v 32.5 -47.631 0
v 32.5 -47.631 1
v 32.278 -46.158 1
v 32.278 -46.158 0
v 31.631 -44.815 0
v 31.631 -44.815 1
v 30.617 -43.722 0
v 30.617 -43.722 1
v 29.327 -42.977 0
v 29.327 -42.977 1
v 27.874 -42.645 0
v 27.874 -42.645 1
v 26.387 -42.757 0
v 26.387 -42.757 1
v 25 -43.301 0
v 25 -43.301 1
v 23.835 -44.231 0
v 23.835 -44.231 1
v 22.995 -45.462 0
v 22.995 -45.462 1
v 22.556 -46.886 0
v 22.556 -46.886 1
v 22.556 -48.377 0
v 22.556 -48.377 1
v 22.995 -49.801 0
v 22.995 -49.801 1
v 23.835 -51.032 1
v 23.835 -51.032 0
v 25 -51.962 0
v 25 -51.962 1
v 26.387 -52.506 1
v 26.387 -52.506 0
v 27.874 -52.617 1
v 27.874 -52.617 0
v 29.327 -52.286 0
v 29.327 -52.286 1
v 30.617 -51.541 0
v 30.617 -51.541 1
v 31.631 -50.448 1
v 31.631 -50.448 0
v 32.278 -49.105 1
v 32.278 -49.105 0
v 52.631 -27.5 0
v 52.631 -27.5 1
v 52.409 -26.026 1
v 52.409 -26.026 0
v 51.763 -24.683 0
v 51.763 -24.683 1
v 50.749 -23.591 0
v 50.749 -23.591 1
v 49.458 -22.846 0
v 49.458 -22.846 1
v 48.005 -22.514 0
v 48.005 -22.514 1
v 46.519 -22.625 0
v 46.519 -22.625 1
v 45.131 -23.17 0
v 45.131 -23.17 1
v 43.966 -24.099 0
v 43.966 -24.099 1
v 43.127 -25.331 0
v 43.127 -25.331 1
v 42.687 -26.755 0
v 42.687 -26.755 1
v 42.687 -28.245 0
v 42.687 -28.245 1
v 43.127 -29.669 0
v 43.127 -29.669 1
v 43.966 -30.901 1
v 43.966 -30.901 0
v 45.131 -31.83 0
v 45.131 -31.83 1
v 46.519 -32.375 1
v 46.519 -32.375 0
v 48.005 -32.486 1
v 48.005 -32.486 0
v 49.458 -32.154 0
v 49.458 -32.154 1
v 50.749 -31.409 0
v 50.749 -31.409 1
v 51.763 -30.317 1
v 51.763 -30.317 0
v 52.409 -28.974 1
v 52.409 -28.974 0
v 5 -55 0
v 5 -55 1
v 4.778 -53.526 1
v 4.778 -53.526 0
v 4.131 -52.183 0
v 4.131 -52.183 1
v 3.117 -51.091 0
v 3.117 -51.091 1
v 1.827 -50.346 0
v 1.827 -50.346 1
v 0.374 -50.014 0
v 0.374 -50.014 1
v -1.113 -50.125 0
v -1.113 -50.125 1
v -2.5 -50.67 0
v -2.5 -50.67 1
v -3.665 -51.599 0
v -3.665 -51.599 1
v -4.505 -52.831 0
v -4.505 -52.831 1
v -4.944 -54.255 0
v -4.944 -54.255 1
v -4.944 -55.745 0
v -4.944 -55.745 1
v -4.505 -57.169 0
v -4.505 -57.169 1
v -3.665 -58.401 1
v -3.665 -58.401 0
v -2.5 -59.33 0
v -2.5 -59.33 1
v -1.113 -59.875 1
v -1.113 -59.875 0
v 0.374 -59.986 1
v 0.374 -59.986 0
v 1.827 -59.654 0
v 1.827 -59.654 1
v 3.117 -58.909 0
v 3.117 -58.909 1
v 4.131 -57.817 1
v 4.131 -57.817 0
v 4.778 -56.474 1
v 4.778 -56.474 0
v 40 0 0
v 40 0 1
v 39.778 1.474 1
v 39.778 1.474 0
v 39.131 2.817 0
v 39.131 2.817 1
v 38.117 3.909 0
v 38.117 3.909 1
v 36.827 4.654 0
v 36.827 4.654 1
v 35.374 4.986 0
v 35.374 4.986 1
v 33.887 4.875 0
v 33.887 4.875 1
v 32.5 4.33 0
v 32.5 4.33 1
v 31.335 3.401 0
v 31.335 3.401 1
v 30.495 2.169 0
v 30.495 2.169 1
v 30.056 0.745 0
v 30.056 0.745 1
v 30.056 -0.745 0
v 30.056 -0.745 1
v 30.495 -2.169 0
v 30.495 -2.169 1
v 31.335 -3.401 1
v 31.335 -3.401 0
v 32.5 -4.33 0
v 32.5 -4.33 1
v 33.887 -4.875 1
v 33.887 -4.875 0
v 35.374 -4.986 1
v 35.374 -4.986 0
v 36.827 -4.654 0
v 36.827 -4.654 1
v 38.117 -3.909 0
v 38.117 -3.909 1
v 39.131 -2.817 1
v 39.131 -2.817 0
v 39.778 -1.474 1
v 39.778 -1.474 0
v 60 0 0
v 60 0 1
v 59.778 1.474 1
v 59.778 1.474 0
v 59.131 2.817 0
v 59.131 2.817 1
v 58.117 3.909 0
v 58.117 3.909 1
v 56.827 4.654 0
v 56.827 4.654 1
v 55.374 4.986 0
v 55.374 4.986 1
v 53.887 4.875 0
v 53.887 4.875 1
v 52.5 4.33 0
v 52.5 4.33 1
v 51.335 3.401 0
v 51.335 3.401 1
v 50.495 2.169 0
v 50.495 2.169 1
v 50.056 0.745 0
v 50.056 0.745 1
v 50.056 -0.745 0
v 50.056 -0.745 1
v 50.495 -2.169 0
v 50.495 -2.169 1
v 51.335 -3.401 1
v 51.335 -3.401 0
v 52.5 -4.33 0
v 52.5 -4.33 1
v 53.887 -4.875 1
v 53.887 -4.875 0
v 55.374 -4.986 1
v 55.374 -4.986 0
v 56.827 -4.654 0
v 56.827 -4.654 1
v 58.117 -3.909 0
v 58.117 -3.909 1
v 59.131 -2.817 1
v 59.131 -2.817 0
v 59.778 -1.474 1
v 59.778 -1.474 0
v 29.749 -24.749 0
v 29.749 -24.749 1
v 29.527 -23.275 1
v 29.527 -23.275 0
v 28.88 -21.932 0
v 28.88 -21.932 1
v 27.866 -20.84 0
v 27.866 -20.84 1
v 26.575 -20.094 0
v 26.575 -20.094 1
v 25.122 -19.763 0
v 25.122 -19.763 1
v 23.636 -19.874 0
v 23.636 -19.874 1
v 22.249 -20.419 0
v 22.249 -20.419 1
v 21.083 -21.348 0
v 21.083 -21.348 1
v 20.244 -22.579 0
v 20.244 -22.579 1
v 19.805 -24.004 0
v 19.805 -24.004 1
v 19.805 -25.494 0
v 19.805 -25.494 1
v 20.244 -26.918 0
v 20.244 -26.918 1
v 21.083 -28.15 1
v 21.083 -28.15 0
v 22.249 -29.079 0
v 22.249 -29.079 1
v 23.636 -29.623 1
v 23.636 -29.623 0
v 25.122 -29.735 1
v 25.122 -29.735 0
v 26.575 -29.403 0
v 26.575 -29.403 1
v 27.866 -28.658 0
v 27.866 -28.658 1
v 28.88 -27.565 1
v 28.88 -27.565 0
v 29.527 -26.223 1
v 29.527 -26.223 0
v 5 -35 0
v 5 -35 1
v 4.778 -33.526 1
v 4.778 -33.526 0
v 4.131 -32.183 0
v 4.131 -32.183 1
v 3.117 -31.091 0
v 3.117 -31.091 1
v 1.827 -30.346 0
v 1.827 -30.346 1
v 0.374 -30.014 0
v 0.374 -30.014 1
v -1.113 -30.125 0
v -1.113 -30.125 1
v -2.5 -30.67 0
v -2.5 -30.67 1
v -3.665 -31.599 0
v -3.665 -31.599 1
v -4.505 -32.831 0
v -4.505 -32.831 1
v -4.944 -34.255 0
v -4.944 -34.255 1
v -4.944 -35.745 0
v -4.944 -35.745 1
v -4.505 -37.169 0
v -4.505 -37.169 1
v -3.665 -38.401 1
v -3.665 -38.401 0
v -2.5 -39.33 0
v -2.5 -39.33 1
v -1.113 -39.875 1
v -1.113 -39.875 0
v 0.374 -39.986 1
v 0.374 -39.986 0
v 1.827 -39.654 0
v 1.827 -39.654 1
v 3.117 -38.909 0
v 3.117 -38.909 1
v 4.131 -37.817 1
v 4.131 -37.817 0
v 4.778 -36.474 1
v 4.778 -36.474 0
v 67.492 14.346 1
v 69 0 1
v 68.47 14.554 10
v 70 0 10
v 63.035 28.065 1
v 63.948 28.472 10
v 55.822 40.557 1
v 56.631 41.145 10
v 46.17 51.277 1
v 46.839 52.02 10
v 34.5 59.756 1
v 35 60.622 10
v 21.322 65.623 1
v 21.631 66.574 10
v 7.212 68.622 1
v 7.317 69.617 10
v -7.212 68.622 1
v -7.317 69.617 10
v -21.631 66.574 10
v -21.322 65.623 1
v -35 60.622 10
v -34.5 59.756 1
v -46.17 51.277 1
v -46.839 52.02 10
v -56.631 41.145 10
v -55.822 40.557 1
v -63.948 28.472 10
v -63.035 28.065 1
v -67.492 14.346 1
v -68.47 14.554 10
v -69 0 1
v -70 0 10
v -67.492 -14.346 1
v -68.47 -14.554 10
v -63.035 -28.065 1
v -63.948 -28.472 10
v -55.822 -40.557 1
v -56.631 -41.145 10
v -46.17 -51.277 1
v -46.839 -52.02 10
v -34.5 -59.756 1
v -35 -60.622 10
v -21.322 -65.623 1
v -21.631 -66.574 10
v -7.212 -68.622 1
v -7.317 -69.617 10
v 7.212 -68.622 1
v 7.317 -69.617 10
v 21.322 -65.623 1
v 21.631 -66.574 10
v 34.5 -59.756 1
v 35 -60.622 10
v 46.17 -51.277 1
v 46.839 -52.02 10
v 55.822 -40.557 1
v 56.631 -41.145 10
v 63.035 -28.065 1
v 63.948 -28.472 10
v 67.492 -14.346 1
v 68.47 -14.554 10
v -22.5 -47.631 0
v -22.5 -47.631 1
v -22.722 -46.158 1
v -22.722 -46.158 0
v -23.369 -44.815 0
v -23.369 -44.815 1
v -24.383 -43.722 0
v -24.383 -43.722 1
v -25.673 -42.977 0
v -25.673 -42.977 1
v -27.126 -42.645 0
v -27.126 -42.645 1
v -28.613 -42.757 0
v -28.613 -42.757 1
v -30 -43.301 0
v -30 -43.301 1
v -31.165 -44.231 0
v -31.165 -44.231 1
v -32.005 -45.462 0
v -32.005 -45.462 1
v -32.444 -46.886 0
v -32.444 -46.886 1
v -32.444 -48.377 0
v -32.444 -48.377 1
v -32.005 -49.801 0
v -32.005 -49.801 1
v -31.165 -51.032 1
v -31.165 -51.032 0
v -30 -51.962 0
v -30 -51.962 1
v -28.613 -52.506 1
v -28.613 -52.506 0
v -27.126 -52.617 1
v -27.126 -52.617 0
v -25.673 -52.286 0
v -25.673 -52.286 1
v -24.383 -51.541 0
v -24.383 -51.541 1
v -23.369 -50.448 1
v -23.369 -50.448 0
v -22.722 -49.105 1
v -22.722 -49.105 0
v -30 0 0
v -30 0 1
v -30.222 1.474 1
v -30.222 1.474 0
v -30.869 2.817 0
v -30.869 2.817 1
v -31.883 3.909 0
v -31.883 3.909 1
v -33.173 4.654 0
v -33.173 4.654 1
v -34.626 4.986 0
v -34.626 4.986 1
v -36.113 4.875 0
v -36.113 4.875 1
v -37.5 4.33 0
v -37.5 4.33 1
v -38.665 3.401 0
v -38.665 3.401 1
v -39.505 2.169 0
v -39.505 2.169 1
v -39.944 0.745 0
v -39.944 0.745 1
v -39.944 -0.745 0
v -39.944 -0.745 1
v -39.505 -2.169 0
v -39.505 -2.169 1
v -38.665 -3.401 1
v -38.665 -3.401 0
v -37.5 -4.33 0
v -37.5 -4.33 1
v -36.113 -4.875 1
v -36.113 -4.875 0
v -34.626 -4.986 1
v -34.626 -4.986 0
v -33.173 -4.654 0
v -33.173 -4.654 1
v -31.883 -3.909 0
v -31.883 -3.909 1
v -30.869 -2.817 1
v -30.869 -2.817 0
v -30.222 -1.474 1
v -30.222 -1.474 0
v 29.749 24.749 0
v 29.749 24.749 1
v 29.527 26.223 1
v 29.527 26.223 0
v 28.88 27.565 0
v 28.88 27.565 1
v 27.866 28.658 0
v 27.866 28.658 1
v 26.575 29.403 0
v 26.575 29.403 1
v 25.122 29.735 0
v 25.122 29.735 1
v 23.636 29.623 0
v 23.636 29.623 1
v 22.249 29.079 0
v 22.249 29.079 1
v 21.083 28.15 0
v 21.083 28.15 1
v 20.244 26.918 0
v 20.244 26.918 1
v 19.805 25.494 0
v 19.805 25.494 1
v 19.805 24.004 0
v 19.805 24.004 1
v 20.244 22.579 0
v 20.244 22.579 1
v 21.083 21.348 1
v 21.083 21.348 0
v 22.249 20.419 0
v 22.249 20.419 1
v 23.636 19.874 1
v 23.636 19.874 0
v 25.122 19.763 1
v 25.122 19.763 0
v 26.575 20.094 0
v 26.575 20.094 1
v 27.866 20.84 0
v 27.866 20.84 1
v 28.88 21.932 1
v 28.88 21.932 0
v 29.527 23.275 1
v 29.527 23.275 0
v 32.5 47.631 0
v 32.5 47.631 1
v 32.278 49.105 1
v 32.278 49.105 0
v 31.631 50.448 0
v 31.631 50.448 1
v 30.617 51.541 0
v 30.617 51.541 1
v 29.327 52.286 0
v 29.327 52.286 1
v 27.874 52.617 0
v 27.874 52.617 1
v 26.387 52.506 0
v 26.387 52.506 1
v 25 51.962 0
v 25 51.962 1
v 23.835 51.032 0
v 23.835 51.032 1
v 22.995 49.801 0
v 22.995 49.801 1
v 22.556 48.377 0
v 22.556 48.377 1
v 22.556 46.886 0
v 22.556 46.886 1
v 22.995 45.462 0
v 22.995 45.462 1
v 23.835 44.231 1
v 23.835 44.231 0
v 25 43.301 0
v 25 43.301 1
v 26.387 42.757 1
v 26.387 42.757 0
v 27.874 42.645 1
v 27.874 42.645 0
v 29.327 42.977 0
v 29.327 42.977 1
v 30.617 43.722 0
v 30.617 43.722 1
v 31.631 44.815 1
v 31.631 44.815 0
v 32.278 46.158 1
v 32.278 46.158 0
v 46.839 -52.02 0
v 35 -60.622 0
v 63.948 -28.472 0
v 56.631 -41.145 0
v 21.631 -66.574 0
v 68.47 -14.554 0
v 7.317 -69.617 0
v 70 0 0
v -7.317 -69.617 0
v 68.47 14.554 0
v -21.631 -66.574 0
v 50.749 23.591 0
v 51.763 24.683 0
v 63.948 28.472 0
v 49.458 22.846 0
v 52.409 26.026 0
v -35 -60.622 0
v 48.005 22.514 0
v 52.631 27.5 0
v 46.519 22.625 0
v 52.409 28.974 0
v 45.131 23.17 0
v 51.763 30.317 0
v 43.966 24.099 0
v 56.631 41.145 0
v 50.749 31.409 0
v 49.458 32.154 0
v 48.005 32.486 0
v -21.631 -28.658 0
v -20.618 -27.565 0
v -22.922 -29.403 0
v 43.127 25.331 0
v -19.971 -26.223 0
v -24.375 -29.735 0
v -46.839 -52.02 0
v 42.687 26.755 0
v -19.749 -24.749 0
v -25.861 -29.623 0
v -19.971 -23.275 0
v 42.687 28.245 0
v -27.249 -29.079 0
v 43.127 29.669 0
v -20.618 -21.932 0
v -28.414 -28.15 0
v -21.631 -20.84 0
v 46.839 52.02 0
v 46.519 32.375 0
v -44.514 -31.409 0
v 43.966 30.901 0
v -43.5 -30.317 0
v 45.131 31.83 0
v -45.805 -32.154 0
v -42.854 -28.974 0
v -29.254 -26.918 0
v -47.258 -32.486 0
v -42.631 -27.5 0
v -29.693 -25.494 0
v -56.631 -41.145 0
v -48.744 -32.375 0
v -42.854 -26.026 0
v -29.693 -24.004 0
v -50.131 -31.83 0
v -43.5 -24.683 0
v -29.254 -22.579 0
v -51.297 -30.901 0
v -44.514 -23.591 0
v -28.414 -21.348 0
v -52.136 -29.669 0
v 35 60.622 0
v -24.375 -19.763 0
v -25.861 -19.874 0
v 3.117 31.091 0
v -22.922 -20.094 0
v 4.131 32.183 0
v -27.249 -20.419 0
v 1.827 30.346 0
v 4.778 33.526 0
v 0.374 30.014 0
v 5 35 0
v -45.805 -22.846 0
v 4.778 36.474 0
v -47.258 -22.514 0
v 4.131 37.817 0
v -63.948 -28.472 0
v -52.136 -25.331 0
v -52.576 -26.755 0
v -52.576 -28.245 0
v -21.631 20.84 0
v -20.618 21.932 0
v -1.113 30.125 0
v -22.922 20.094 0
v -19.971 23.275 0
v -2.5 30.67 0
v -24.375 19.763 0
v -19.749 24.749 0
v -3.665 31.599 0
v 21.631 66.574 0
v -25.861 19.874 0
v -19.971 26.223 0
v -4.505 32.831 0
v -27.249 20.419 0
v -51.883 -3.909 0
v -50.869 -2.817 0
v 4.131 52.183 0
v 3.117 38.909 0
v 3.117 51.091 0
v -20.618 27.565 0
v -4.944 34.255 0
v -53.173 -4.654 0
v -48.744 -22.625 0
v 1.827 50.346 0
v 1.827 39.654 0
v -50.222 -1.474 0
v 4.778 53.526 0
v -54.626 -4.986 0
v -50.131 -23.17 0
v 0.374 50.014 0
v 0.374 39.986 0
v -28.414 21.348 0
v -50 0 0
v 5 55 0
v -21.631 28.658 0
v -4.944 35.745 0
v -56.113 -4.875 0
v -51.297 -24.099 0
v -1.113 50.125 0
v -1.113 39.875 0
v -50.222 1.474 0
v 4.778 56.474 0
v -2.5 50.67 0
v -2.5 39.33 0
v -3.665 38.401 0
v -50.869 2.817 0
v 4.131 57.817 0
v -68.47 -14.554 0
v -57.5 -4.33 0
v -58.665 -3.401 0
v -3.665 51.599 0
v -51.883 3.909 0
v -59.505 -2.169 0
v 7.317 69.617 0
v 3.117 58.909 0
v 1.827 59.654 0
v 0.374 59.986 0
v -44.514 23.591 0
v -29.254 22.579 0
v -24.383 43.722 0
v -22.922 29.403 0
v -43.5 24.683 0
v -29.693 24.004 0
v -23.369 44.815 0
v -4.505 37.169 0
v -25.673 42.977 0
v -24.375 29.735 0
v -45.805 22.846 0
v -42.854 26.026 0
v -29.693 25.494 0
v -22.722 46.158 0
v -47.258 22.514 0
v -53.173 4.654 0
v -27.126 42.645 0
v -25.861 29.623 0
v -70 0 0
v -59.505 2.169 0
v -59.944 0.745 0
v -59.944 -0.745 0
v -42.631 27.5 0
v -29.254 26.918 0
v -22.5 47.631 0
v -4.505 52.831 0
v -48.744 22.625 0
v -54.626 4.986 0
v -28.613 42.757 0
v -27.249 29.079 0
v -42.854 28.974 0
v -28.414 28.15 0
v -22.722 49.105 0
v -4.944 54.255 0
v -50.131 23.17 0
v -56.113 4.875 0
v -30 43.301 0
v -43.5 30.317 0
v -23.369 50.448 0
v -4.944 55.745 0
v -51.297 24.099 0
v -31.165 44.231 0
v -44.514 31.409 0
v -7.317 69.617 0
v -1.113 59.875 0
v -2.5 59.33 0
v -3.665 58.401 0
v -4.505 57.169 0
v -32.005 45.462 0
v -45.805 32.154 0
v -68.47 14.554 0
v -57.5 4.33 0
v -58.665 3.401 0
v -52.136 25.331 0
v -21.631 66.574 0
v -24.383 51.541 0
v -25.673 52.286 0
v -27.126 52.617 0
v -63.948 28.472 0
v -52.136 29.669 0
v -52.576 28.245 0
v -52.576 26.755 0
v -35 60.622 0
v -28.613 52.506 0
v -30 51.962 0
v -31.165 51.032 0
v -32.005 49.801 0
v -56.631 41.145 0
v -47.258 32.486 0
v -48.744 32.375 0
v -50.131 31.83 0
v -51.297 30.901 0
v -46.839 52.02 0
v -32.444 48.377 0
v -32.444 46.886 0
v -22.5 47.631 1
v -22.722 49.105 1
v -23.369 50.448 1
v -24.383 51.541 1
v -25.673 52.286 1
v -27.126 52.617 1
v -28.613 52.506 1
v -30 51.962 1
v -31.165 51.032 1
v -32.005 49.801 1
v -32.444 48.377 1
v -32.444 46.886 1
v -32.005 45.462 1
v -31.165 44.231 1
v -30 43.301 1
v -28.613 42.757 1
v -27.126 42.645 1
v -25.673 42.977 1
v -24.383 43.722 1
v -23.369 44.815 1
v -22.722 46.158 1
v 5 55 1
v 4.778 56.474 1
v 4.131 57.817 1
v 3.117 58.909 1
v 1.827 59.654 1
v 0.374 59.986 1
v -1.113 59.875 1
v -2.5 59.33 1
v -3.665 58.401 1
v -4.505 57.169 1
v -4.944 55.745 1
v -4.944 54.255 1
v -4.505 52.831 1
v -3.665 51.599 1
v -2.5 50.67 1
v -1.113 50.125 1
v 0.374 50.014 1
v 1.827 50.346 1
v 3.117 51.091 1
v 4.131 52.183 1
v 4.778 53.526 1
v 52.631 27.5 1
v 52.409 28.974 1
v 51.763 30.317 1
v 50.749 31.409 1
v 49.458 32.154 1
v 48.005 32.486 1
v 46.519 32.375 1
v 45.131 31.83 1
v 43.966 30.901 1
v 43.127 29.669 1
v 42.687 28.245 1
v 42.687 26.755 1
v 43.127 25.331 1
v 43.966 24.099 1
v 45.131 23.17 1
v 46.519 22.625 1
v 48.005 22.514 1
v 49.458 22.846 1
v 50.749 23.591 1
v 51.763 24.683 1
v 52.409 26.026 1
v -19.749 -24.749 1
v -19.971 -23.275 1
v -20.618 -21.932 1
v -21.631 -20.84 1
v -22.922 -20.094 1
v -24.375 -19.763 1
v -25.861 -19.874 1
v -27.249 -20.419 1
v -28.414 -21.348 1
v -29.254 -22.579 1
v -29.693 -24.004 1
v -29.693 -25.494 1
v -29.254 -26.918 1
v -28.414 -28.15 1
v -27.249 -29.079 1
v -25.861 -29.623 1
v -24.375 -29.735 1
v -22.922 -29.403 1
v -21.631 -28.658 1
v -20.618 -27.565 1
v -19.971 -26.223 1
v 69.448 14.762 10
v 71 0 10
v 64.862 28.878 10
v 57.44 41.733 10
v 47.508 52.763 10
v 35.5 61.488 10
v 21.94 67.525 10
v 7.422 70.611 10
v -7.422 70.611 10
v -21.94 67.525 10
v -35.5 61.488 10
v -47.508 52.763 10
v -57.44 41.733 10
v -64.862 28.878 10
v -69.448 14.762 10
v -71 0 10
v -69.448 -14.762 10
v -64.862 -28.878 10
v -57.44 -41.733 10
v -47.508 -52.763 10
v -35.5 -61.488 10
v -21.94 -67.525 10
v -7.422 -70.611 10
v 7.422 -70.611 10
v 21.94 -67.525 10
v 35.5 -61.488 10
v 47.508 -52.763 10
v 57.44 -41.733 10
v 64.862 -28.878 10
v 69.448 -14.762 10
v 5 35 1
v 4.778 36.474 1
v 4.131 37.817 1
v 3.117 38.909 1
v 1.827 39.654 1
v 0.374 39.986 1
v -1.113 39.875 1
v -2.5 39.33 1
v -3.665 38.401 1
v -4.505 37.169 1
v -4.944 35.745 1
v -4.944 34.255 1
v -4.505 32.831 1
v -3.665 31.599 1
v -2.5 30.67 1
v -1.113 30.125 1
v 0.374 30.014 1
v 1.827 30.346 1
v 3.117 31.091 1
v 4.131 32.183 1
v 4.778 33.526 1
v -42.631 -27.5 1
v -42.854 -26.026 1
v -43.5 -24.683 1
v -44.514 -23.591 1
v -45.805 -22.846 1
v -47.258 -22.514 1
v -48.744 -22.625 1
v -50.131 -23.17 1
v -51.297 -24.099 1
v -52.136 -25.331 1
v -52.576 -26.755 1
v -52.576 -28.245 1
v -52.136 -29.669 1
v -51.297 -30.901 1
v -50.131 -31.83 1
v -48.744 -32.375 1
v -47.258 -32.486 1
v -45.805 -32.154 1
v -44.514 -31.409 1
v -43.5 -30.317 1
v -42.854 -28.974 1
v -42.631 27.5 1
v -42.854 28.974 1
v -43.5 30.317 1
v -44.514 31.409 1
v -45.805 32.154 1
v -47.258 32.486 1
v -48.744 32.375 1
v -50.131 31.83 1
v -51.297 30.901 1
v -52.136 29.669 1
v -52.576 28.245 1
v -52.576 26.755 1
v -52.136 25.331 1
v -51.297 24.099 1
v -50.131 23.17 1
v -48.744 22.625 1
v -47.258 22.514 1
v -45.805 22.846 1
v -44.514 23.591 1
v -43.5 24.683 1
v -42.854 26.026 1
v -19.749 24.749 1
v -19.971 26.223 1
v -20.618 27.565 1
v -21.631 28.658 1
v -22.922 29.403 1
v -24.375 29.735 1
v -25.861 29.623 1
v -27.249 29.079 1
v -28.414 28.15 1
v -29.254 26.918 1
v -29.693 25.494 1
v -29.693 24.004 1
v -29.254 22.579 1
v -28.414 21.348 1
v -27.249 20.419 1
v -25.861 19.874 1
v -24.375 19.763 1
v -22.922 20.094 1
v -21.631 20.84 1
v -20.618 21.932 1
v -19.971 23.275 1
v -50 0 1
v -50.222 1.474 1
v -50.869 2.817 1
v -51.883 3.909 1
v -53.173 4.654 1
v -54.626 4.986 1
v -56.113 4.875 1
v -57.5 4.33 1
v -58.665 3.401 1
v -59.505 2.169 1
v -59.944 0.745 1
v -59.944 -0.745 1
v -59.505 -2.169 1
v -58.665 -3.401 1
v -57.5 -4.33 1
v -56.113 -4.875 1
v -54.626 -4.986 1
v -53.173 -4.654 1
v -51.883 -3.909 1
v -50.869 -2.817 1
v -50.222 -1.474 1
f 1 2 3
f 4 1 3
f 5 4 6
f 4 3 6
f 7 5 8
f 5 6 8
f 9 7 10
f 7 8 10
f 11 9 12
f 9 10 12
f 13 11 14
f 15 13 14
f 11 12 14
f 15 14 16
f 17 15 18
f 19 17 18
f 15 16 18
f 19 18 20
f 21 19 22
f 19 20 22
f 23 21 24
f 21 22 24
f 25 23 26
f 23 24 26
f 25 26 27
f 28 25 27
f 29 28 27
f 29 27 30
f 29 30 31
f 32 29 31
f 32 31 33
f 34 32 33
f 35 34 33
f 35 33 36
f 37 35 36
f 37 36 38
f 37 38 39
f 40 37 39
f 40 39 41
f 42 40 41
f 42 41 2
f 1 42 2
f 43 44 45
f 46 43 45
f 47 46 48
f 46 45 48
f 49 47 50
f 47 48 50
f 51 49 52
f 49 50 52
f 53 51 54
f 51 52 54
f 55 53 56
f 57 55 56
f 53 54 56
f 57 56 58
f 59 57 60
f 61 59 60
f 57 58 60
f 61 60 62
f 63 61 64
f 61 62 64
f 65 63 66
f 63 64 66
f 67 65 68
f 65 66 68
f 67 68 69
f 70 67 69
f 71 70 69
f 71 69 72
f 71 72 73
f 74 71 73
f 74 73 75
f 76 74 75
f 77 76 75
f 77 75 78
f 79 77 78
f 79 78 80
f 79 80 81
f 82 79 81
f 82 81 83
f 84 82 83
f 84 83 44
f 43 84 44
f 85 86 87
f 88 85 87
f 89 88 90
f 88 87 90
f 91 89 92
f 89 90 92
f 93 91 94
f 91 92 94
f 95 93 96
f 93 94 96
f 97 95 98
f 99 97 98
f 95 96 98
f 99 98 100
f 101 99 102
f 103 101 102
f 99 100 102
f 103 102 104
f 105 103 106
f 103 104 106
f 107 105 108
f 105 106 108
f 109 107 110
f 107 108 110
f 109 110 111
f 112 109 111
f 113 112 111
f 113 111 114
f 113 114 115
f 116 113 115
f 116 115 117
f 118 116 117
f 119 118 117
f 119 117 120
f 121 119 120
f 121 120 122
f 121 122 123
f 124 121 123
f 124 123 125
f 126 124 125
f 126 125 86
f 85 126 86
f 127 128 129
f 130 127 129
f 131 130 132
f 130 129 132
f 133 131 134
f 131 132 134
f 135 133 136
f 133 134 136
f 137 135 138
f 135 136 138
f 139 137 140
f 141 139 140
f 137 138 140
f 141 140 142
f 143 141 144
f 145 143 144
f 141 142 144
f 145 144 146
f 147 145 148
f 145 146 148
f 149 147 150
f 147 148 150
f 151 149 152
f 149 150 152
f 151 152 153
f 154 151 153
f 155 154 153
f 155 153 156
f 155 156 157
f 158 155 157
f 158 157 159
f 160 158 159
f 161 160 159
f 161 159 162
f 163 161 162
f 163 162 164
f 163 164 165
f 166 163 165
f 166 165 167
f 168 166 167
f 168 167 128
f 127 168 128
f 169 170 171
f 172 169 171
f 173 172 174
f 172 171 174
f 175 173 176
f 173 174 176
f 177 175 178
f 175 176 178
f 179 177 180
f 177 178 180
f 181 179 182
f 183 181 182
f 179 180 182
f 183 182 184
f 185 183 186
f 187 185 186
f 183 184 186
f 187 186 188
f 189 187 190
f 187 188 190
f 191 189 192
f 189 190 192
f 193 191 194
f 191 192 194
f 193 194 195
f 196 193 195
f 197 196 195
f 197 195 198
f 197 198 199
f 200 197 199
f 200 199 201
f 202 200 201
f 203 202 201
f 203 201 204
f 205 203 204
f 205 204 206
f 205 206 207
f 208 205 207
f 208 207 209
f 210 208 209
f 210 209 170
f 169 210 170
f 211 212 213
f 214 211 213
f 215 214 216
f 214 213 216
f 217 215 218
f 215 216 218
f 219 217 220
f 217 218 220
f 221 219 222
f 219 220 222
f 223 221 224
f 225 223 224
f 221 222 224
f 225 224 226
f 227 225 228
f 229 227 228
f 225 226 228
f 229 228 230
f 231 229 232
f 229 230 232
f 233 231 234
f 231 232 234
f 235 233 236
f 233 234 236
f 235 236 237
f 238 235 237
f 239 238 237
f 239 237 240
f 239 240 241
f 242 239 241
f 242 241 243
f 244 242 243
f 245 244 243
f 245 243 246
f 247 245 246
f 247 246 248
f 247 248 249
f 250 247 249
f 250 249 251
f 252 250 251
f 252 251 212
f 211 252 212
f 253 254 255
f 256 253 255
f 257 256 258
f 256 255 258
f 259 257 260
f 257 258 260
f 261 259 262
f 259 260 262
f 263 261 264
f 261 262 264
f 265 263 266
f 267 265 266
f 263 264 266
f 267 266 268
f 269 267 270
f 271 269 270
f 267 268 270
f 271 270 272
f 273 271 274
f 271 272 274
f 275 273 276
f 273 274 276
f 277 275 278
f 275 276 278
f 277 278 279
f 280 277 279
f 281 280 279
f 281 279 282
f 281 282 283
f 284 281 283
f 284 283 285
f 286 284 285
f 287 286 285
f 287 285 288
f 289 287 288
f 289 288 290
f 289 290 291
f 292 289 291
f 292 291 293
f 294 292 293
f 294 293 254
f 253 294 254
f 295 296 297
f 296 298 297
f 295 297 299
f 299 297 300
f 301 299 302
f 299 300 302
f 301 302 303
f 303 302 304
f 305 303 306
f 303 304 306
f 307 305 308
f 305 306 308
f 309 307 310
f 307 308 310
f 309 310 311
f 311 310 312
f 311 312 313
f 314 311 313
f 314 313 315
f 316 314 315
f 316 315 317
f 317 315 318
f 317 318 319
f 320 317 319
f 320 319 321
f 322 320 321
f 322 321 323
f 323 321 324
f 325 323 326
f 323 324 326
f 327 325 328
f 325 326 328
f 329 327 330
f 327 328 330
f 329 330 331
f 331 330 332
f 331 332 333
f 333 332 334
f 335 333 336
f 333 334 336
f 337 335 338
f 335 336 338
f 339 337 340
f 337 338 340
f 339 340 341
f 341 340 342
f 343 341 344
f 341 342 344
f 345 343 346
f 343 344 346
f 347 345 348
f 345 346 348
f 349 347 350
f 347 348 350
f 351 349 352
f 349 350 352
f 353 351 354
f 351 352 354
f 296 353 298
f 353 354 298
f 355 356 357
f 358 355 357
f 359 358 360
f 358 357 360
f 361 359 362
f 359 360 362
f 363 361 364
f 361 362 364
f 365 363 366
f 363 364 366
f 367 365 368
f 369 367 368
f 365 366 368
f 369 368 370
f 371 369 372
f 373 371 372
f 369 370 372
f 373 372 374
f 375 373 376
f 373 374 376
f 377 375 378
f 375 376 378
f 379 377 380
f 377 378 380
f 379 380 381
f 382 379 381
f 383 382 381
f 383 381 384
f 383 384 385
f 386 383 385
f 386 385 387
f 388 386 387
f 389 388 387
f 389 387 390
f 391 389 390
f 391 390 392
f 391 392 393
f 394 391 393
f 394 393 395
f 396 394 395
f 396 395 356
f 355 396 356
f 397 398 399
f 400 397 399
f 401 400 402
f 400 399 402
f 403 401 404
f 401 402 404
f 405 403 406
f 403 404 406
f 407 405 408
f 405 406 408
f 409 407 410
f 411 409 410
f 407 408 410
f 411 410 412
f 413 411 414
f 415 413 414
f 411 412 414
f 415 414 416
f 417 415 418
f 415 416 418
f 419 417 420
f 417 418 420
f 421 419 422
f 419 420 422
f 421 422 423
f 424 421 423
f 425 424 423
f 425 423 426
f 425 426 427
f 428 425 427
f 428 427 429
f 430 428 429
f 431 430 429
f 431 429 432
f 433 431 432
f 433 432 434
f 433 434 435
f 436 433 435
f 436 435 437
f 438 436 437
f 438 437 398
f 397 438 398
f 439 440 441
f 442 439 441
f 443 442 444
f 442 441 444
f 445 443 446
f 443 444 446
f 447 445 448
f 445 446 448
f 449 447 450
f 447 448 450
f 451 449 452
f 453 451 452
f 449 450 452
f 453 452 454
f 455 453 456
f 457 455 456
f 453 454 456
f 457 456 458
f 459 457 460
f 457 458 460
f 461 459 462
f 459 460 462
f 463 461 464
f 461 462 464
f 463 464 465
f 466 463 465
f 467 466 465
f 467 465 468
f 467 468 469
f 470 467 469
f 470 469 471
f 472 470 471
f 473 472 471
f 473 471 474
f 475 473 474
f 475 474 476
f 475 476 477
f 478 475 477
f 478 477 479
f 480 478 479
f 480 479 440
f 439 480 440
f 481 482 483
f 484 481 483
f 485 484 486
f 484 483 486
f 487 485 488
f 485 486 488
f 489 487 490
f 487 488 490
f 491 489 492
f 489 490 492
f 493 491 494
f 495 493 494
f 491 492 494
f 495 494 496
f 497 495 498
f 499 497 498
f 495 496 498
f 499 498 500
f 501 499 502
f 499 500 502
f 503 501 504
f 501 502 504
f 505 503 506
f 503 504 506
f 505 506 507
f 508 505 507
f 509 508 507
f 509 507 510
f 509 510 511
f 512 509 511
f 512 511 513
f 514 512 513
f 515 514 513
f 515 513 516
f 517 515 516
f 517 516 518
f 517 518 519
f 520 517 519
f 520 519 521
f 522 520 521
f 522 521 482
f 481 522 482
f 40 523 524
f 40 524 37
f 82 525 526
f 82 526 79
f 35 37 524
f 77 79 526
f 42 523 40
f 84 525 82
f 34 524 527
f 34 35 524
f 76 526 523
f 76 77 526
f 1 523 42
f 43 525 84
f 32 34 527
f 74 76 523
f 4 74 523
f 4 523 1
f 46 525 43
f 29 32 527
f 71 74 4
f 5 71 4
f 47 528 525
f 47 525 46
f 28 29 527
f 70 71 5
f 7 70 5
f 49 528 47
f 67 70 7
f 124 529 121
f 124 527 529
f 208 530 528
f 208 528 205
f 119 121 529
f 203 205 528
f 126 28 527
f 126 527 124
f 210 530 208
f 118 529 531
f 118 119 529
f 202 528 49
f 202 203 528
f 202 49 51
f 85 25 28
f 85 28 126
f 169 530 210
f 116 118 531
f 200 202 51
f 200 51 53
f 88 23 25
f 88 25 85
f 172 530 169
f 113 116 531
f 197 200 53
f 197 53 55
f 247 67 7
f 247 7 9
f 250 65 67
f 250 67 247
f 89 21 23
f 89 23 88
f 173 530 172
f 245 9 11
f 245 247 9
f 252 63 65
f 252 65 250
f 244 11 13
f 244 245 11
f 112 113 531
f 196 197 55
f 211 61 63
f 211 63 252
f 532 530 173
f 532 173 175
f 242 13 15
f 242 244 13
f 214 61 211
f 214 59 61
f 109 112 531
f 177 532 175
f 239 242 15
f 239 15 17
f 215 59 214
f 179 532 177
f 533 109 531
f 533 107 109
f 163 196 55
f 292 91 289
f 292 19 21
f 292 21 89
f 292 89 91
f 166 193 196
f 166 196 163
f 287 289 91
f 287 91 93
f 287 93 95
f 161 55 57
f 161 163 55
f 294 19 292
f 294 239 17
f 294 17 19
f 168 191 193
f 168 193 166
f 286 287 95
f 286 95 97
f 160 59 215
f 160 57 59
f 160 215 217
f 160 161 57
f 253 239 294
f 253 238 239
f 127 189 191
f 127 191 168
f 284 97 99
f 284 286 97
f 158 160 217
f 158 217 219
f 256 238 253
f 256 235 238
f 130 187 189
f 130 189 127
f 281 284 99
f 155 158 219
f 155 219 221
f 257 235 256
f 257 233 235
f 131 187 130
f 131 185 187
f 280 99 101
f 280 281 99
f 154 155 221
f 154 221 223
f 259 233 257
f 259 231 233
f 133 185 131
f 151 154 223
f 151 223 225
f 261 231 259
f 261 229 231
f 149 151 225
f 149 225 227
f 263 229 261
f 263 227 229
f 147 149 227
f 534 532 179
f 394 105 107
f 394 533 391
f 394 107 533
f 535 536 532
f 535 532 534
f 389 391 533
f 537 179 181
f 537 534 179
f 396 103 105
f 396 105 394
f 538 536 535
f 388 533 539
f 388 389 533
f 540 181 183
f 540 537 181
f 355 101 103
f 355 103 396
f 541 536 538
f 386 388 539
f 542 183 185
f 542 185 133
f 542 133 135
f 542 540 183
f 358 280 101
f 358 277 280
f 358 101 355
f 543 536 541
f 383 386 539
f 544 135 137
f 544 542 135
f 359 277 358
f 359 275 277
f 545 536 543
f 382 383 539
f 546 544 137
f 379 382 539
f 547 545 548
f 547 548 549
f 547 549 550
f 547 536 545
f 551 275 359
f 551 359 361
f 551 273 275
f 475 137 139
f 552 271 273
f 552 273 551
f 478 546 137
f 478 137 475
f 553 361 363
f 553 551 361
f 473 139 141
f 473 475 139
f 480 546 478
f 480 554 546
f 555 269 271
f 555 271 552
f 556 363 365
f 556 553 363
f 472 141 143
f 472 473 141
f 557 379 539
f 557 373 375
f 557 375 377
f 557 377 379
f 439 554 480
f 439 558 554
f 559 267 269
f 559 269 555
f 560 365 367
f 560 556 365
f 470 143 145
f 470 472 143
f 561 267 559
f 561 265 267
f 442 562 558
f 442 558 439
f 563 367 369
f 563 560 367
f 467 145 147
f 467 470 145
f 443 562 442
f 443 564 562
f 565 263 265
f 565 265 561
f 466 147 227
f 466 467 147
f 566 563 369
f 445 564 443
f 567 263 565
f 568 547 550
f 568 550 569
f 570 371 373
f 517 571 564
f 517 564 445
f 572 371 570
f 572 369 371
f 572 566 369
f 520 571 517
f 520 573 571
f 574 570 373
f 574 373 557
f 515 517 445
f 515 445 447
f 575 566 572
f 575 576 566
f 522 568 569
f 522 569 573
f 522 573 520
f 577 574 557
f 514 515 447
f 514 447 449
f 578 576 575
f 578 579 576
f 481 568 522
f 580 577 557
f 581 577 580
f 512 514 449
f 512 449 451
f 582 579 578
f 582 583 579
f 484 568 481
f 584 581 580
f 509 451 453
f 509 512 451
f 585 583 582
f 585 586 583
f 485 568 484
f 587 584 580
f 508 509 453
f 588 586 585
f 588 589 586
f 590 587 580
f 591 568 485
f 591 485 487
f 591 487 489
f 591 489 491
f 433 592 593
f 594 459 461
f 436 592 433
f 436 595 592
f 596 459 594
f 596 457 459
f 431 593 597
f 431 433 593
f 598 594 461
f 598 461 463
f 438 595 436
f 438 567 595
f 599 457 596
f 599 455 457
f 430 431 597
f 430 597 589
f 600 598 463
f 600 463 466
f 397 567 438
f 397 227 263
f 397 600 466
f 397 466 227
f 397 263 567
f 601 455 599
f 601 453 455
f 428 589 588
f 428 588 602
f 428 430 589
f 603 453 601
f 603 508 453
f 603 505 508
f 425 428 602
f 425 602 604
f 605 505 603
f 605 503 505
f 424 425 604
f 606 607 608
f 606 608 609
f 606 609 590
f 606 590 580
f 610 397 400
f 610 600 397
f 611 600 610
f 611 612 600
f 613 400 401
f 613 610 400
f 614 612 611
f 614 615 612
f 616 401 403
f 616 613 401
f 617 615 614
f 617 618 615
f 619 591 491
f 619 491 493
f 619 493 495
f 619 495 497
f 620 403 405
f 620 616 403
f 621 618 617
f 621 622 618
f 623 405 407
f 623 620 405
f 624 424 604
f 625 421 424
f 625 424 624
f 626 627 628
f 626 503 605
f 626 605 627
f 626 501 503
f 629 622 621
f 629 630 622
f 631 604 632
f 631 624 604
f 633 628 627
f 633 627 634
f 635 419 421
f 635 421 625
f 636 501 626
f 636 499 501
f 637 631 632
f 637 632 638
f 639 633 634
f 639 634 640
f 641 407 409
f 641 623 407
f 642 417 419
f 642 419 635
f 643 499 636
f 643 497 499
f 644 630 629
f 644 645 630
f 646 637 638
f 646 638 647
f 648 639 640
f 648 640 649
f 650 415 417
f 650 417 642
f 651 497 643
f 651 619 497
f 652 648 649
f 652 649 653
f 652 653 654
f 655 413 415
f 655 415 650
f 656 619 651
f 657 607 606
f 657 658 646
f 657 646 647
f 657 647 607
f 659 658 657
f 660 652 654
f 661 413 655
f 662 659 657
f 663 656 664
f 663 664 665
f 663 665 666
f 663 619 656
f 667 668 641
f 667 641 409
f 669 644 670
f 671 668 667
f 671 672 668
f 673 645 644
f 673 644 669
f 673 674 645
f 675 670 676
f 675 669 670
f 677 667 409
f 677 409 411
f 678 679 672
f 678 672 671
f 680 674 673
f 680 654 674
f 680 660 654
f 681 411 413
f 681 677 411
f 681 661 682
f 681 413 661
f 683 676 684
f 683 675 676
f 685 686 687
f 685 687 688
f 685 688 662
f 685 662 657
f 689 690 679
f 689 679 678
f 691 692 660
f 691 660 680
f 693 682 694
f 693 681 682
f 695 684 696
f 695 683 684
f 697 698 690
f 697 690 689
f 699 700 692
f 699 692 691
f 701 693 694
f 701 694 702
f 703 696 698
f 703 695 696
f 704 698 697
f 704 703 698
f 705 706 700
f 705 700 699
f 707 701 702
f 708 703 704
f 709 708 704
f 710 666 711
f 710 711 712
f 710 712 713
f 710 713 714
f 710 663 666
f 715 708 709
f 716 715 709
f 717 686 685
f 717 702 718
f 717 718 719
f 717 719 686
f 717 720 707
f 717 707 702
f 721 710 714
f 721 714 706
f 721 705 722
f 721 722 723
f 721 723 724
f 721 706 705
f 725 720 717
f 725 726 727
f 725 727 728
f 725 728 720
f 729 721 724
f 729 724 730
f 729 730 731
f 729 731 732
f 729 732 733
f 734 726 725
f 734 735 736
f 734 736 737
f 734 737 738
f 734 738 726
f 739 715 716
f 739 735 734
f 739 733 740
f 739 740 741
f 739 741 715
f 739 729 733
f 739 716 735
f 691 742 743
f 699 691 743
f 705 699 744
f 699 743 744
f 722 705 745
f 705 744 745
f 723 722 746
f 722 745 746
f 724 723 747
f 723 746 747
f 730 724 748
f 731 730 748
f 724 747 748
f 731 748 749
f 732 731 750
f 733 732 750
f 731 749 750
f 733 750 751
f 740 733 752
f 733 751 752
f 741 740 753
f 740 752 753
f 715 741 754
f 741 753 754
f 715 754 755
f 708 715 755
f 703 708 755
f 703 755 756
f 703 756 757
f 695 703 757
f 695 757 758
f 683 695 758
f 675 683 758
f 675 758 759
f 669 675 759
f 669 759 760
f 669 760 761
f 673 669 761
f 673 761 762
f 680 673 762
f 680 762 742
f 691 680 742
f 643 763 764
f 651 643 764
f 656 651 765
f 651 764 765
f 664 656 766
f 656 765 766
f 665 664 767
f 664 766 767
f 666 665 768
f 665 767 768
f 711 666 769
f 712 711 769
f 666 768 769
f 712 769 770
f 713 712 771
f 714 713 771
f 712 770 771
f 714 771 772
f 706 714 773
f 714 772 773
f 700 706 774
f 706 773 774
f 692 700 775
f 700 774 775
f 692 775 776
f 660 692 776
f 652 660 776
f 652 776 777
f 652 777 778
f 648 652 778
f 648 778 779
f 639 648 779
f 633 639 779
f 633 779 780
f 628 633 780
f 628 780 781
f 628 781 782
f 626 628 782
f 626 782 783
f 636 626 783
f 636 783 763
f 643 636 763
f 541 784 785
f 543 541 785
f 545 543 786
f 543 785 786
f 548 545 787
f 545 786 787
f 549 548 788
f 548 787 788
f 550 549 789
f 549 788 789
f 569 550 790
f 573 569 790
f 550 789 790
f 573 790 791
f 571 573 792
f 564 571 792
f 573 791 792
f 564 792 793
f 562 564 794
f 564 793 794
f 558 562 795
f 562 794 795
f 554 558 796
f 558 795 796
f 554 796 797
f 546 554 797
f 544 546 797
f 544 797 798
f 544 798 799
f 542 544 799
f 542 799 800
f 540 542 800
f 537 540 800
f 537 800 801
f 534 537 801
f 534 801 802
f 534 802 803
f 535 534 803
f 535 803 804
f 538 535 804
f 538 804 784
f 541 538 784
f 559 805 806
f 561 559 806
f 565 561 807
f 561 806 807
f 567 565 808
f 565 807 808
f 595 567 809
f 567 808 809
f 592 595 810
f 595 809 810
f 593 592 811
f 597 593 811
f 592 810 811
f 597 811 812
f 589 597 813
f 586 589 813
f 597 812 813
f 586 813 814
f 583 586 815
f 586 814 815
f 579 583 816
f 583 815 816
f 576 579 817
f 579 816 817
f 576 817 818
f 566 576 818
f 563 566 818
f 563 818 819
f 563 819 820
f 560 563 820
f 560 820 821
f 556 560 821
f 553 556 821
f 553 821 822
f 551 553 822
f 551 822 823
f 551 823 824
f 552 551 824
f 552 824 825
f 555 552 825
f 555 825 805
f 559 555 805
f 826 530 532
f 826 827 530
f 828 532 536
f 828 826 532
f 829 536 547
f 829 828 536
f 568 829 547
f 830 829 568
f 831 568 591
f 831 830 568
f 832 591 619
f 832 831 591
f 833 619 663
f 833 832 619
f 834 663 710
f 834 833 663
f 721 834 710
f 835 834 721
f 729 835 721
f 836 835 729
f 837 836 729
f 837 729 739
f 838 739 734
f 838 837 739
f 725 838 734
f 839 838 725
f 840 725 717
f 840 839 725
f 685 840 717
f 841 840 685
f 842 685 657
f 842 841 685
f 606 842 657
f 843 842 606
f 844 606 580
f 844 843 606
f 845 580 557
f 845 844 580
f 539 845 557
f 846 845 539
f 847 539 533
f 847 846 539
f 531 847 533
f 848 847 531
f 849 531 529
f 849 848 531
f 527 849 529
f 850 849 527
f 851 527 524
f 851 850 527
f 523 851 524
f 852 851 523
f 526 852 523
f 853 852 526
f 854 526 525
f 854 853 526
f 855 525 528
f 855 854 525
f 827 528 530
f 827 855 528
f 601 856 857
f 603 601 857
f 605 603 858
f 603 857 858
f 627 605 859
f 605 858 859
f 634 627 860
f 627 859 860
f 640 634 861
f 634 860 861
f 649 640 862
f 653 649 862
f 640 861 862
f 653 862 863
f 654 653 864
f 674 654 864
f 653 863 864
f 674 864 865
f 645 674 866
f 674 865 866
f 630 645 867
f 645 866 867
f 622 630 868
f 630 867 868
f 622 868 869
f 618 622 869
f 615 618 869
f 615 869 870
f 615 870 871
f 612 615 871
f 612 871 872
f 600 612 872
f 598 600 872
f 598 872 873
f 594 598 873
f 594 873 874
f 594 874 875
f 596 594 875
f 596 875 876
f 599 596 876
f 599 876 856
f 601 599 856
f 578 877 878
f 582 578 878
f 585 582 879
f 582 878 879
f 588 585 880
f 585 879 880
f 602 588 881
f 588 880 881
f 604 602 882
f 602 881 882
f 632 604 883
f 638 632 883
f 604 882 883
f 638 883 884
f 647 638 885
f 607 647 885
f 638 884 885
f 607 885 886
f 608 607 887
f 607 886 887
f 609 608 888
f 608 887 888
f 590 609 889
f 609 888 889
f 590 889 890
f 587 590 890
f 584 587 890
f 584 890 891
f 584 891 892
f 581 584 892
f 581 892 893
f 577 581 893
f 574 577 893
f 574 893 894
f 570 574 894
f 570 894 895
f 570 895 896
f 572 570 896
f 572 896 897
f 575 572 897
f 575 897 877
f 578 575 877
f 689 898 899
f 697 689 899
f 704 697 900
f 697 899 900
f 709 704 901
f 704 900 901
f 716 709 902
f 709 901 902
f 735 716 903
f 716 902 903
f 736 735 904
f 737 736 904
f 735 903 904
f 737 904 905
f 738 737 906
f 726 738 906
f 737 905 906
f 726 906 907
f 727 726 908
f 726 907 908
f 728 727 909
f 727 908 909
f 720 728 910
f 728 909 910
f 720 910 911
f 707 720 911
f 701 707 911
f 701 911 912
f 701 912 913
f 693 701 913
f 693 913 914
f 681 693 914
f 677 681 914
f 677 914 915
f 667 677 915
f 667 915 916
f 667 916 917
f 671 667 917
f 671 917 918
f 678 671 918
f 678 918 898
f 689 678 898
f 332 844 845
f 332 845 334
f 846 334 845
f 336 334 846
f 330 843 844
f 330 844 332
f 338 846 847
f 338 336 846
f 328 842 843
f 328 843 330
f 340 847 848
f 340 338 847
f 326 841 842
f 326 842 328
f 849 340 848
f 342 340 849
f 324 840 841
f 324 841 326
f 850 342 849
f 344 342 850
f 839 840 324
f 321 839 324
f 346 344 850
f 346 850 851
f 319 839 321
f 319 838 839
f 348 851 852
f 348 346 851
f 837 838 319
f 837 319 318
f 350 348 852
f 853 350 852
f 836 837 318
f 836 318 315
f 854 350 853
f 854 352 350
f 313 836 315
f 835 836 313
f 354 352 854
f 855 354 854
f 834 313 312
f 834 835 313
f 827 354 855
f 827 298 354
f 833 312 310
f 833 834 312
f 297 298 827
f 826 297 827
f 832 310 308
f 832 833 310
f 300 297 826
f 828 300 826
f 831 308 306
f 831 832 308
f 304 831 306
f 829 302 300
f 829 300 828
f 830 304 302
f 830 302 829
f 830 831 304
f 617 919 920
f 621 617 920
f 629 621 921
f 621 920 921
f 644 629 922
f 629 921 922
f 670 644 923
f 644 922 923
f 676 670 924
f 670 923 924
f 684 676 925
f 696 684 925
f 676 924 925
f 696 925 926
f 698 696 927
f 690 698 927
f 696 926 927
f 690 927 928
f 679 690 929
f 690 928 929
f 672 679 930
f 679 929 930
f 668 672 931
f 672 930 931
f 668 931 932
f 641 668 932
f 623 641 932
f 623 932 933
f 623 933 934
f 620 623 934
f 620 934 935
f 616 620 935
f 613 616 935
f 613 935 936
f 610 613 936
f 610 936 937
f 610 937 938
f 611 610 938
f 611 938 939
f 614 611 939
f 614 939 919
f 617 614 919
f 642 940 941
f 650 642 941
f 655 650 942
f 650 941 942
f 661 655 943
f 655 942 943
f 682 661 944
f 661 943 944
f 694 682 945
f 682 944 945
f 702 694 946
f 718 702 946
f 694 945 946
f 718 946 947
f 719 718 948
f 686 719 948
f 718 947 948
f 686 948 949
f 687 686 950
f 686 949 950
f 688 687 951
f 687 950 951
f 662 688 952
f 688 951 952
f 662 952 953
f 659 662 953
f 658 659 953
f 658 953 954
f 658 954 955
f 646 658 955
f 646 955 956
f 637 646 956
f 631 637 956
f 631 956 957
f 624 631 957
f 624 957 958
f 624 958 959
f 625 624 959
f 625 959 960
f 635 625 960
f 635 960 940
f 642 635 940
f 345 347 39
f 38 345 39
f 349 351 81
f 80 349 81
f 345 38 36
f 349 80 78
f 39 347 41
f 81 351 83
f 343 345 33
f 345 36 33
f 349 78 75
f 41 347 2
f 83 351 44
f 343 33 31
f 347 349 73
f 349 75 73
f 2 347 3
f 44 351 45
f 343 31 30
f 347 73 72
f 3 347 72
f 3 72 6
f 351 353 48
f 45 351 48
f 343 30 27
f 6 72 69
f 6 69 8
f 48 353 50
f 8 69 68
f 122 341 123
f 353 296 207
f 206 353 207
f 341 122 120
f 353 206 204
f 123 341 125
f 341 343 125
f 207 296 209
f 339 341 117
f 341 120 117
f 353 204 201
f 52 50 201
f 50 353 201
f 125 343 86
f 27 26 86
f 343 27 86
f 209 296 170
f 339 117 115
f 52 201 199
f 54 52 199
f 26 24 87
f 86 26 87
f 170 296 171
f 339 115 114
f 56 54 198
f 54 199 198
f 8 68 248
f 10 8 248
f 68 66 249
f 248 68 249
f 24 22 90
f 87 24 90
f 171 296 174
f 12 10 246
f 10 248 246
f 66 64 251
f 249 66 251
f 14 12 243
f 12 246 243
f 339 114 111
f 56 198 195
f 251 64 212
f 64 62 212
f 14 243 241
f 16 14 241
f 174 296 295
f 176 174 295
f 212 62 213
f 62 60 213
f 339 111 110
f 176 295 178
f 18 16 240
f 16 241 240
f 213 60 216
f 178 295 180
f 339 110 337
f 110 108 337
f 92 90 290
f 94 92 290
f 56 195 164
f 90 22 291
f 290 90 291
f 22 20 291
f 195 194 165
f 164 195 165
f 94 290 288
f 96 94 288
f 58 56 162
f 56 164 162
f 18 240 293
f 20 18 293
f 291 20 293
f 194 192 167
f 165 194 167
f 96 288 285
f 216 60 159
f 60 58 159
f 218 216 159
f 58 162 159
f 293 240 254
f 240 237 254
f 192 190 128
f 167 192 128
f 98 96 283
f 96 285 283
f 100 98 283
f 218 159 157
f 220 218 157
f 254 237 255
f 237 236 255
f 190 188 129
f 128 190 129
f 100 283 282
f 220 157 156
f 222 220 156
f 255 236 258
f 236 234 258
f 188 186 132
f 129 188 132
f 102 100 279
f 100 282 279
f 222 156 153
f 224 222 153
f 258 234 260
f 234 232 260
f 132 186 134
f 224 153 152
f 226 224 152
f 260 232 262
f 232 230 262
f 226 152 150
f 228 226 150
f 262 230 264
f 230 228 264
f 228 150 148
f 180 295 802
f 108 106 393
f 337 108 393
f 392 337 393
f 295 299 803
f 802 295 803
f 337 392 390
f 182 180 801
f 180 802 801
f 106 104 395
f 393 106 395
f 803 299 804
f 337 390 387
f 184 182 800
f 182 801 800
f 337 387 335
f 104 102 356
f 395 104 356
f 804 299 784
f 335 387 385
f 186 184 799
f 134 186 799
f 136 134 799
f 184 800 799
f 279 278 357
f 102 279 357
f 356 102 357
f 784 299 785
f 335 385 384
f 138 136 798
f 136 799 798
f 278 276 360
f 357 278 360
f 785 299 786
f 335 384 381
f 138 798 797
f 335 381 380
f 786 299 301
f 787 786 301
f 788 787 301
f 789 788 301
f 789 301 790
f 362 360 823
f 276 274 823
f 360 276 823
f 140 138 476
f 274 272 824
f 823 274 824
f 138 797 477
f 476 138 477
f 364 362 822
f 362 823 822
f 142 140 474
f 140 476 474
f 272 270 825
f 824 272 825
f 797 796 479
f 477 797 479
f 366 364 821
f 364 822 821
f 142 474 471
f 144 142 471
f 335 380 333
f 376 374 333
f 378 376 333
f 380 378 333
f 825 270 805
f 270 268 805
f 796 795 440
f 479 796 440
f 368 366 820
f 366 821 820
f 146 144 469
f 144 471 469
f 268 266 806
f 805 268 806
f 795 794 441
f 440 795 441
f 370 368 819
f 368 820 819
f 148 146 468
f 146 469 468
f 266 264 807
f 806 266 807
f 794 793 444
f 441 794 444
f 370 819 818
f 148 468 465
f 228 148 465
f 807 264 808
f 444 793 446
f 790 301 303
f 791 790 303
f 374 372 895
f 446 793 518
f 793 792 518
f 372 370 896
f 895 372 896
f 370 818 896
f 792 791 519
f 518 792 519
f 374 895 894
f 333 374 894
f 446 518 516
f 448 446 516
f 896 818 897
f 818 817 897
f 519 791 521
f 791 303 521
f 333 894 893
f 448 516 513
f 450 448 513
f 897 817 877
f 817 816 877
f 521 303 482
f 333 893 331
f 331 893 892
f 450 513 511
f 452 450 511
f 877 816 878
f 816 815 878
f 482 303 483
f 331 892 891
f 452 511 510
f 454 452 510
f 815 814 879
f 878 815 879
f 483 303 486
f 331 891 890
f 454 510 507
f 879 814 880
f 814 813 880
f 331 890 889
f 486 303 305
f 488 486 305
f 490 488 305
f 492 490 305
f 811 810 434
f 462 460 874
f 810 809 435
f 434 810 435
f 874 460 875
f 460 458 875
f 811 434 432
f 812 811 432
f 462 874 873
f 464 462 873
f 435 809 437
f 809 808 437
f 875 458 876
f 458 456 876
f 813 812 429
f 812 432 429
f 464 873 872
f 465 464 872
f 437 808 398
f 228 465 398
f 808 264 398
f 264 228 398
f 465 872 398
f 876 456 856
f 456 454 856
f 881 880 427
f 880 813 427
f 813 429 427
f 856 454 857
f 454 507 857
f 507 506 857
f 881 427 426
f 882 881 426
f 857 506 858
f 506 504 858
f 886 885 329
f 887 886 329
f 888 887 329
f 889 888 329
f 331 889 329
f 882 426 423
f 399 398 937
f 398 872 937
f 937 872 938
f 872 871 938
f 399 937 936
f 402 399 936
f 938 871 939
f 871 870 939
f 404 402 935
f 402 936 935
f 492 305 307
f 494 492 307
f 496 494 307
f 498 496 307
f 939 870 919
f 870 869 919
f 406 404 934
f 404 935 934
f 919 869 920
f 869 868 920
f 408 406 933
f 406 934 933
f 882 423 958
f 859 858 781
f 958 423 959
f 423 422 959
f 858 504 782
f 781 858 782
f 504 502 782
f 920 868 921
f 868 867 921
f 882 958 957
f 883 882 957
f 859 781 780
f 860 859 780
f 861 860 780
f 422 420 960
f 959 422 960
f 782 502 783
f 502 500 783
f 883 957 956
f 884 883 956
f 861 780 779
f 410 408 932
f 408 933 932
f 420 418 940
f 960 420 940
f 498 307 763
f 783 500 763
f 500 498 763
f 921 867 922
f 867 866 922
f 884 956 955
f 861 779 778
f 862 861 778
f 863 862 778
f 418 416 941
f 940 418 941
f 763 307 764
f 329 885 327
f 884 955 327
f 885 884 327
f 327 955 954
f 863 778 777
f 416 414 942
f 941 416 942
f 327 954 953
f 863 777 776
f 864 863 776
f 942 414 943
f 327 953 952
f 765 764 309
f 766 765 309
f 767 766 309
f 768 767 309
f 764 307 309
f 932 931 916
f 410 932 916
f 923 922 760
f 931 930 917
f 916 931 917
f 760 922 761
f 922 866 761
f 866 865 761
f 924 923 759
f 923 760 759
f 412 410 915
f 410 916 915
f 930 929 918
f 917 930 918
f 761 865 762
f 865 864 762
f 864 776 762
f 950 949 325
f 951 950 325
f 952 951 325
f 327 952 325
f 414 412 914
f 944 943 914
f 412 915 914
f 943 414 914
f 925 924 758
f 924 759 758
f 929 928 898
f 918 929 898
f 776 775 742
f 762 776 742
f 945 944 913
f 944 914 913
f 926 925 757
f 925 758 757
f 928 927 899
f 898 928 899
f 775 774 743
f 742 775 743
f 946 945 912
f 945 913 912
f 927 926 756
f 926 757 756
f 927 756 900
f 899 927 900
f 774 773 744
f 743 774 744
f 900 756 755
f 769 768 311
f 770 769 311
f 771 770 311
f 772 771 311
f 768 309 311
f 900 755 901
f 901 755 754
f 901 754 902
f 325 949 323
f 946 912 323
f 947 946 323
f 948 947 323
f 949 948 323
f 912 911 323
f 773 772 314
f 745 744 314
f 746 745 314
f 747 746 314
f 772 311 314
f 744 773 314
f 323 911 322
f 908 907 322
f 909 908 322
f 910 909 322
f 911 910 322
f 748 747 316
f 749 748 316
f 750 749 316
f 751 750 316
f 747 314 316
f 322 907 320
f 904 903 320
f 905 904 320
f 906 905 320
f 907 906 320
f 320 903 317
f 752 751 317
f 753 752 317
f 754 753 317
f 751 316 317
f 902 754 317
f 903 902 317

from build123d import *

# Parameters (mm, degrees)
SKETCH008_R      = 5
EXTRUDE002_DEPTH = 10


with BuildPart() as extrude002:
    # Sketch008 (on Face5 of Cut002) → Extrude002 (new body)
    with BuildSketch(Plane.XY.offset(1)):
        with Locations((35, 0)):
            Circle(SKETCH008_R)
        with Locations((0, 35)):
            Circle(SKETCH008_R)
        with Locations((-35, 0)):
            Circle(SKETCH008_R)
        with Locations((0, -35)):
            Circle(SKETCH008_R)
        with Locations((0, 55)):
            Circle(SKETCH008_R)
        with Locations((55, 0)):
            Circle(SKETCH008_R)
        with Locations((0, -55)):
            Circle(SKETCH008_R)
        with Locations((-55, 0)):
            Circle(SKETCH008_R)
        with Locations((-24.748737, 24.748737)):
            Circle(SKETCH008_R)
        with Locations((-24.748737, -24.748737)):
            Circle(SKETCH008_R)
        with Locations((24.748737, -24.748737)):
            Circle(SKETCH008_R)
        with Locations((24.748737, 24.748737)):
            Circle(SKETCH008_R)
        with Locations((-47.631397, 27.5)):
            Circle(SKETCH008_R)
        with Locations((-27.5, 47.631397)):
            Circle(SKETCH008_R)
        with Locations((27.5, 47.631397)):
            Circle(SKETCH008_R)
        with Locations((47.631397, 27.5)):
            Circle(SKETCH008_R)
        with Locations((47.631397, -27.5)):
            Circle(SKETCH008_R)
        with Locations((27.5, -47.631397)):
            Circle(SKETCH008_R)
        with Locations((-27.5, -47.631397)):
            Circle(SKETCH008_R)
        with Locations((-47.631397, -27.5)):
            Circle(SKETCH008_R)
    extrude(amount=-EXTRUDE002_DEPTH)


with BuildPart() as cone003:
    # Cone003 → Cone003 (revolve)
    with BuildSketch(Plane(origin=(0, 0, 1), x_dir=(1, 0, 0), z_dir=(0, -1, 0))):
        Polygon((0, 0), (69, 0), (70, 9), (0, 9), align=None)
    revolve(axis=Axis((0, 0, 1), (0, 0, 1)))


with BuildPart() as simple_bottom:
    # Cone002 → Cone002 (revolve)
    with BuildSketch(Plane.XZ):
        Polygon((0, 0), (70, 0), (71, 10), (0, 10), align=None)
    revolve(axis=Axis((0, 0, 0), (0, 0, 1)))

    # Cut002: cut Cone003
    add(cone003.part, mode=Mode.SUBTRACT)

    # Cut003: cut Extrude002
    add(extrude002.part, mode=Mode.SUBTRACT)


solid = simple_bottom.part
